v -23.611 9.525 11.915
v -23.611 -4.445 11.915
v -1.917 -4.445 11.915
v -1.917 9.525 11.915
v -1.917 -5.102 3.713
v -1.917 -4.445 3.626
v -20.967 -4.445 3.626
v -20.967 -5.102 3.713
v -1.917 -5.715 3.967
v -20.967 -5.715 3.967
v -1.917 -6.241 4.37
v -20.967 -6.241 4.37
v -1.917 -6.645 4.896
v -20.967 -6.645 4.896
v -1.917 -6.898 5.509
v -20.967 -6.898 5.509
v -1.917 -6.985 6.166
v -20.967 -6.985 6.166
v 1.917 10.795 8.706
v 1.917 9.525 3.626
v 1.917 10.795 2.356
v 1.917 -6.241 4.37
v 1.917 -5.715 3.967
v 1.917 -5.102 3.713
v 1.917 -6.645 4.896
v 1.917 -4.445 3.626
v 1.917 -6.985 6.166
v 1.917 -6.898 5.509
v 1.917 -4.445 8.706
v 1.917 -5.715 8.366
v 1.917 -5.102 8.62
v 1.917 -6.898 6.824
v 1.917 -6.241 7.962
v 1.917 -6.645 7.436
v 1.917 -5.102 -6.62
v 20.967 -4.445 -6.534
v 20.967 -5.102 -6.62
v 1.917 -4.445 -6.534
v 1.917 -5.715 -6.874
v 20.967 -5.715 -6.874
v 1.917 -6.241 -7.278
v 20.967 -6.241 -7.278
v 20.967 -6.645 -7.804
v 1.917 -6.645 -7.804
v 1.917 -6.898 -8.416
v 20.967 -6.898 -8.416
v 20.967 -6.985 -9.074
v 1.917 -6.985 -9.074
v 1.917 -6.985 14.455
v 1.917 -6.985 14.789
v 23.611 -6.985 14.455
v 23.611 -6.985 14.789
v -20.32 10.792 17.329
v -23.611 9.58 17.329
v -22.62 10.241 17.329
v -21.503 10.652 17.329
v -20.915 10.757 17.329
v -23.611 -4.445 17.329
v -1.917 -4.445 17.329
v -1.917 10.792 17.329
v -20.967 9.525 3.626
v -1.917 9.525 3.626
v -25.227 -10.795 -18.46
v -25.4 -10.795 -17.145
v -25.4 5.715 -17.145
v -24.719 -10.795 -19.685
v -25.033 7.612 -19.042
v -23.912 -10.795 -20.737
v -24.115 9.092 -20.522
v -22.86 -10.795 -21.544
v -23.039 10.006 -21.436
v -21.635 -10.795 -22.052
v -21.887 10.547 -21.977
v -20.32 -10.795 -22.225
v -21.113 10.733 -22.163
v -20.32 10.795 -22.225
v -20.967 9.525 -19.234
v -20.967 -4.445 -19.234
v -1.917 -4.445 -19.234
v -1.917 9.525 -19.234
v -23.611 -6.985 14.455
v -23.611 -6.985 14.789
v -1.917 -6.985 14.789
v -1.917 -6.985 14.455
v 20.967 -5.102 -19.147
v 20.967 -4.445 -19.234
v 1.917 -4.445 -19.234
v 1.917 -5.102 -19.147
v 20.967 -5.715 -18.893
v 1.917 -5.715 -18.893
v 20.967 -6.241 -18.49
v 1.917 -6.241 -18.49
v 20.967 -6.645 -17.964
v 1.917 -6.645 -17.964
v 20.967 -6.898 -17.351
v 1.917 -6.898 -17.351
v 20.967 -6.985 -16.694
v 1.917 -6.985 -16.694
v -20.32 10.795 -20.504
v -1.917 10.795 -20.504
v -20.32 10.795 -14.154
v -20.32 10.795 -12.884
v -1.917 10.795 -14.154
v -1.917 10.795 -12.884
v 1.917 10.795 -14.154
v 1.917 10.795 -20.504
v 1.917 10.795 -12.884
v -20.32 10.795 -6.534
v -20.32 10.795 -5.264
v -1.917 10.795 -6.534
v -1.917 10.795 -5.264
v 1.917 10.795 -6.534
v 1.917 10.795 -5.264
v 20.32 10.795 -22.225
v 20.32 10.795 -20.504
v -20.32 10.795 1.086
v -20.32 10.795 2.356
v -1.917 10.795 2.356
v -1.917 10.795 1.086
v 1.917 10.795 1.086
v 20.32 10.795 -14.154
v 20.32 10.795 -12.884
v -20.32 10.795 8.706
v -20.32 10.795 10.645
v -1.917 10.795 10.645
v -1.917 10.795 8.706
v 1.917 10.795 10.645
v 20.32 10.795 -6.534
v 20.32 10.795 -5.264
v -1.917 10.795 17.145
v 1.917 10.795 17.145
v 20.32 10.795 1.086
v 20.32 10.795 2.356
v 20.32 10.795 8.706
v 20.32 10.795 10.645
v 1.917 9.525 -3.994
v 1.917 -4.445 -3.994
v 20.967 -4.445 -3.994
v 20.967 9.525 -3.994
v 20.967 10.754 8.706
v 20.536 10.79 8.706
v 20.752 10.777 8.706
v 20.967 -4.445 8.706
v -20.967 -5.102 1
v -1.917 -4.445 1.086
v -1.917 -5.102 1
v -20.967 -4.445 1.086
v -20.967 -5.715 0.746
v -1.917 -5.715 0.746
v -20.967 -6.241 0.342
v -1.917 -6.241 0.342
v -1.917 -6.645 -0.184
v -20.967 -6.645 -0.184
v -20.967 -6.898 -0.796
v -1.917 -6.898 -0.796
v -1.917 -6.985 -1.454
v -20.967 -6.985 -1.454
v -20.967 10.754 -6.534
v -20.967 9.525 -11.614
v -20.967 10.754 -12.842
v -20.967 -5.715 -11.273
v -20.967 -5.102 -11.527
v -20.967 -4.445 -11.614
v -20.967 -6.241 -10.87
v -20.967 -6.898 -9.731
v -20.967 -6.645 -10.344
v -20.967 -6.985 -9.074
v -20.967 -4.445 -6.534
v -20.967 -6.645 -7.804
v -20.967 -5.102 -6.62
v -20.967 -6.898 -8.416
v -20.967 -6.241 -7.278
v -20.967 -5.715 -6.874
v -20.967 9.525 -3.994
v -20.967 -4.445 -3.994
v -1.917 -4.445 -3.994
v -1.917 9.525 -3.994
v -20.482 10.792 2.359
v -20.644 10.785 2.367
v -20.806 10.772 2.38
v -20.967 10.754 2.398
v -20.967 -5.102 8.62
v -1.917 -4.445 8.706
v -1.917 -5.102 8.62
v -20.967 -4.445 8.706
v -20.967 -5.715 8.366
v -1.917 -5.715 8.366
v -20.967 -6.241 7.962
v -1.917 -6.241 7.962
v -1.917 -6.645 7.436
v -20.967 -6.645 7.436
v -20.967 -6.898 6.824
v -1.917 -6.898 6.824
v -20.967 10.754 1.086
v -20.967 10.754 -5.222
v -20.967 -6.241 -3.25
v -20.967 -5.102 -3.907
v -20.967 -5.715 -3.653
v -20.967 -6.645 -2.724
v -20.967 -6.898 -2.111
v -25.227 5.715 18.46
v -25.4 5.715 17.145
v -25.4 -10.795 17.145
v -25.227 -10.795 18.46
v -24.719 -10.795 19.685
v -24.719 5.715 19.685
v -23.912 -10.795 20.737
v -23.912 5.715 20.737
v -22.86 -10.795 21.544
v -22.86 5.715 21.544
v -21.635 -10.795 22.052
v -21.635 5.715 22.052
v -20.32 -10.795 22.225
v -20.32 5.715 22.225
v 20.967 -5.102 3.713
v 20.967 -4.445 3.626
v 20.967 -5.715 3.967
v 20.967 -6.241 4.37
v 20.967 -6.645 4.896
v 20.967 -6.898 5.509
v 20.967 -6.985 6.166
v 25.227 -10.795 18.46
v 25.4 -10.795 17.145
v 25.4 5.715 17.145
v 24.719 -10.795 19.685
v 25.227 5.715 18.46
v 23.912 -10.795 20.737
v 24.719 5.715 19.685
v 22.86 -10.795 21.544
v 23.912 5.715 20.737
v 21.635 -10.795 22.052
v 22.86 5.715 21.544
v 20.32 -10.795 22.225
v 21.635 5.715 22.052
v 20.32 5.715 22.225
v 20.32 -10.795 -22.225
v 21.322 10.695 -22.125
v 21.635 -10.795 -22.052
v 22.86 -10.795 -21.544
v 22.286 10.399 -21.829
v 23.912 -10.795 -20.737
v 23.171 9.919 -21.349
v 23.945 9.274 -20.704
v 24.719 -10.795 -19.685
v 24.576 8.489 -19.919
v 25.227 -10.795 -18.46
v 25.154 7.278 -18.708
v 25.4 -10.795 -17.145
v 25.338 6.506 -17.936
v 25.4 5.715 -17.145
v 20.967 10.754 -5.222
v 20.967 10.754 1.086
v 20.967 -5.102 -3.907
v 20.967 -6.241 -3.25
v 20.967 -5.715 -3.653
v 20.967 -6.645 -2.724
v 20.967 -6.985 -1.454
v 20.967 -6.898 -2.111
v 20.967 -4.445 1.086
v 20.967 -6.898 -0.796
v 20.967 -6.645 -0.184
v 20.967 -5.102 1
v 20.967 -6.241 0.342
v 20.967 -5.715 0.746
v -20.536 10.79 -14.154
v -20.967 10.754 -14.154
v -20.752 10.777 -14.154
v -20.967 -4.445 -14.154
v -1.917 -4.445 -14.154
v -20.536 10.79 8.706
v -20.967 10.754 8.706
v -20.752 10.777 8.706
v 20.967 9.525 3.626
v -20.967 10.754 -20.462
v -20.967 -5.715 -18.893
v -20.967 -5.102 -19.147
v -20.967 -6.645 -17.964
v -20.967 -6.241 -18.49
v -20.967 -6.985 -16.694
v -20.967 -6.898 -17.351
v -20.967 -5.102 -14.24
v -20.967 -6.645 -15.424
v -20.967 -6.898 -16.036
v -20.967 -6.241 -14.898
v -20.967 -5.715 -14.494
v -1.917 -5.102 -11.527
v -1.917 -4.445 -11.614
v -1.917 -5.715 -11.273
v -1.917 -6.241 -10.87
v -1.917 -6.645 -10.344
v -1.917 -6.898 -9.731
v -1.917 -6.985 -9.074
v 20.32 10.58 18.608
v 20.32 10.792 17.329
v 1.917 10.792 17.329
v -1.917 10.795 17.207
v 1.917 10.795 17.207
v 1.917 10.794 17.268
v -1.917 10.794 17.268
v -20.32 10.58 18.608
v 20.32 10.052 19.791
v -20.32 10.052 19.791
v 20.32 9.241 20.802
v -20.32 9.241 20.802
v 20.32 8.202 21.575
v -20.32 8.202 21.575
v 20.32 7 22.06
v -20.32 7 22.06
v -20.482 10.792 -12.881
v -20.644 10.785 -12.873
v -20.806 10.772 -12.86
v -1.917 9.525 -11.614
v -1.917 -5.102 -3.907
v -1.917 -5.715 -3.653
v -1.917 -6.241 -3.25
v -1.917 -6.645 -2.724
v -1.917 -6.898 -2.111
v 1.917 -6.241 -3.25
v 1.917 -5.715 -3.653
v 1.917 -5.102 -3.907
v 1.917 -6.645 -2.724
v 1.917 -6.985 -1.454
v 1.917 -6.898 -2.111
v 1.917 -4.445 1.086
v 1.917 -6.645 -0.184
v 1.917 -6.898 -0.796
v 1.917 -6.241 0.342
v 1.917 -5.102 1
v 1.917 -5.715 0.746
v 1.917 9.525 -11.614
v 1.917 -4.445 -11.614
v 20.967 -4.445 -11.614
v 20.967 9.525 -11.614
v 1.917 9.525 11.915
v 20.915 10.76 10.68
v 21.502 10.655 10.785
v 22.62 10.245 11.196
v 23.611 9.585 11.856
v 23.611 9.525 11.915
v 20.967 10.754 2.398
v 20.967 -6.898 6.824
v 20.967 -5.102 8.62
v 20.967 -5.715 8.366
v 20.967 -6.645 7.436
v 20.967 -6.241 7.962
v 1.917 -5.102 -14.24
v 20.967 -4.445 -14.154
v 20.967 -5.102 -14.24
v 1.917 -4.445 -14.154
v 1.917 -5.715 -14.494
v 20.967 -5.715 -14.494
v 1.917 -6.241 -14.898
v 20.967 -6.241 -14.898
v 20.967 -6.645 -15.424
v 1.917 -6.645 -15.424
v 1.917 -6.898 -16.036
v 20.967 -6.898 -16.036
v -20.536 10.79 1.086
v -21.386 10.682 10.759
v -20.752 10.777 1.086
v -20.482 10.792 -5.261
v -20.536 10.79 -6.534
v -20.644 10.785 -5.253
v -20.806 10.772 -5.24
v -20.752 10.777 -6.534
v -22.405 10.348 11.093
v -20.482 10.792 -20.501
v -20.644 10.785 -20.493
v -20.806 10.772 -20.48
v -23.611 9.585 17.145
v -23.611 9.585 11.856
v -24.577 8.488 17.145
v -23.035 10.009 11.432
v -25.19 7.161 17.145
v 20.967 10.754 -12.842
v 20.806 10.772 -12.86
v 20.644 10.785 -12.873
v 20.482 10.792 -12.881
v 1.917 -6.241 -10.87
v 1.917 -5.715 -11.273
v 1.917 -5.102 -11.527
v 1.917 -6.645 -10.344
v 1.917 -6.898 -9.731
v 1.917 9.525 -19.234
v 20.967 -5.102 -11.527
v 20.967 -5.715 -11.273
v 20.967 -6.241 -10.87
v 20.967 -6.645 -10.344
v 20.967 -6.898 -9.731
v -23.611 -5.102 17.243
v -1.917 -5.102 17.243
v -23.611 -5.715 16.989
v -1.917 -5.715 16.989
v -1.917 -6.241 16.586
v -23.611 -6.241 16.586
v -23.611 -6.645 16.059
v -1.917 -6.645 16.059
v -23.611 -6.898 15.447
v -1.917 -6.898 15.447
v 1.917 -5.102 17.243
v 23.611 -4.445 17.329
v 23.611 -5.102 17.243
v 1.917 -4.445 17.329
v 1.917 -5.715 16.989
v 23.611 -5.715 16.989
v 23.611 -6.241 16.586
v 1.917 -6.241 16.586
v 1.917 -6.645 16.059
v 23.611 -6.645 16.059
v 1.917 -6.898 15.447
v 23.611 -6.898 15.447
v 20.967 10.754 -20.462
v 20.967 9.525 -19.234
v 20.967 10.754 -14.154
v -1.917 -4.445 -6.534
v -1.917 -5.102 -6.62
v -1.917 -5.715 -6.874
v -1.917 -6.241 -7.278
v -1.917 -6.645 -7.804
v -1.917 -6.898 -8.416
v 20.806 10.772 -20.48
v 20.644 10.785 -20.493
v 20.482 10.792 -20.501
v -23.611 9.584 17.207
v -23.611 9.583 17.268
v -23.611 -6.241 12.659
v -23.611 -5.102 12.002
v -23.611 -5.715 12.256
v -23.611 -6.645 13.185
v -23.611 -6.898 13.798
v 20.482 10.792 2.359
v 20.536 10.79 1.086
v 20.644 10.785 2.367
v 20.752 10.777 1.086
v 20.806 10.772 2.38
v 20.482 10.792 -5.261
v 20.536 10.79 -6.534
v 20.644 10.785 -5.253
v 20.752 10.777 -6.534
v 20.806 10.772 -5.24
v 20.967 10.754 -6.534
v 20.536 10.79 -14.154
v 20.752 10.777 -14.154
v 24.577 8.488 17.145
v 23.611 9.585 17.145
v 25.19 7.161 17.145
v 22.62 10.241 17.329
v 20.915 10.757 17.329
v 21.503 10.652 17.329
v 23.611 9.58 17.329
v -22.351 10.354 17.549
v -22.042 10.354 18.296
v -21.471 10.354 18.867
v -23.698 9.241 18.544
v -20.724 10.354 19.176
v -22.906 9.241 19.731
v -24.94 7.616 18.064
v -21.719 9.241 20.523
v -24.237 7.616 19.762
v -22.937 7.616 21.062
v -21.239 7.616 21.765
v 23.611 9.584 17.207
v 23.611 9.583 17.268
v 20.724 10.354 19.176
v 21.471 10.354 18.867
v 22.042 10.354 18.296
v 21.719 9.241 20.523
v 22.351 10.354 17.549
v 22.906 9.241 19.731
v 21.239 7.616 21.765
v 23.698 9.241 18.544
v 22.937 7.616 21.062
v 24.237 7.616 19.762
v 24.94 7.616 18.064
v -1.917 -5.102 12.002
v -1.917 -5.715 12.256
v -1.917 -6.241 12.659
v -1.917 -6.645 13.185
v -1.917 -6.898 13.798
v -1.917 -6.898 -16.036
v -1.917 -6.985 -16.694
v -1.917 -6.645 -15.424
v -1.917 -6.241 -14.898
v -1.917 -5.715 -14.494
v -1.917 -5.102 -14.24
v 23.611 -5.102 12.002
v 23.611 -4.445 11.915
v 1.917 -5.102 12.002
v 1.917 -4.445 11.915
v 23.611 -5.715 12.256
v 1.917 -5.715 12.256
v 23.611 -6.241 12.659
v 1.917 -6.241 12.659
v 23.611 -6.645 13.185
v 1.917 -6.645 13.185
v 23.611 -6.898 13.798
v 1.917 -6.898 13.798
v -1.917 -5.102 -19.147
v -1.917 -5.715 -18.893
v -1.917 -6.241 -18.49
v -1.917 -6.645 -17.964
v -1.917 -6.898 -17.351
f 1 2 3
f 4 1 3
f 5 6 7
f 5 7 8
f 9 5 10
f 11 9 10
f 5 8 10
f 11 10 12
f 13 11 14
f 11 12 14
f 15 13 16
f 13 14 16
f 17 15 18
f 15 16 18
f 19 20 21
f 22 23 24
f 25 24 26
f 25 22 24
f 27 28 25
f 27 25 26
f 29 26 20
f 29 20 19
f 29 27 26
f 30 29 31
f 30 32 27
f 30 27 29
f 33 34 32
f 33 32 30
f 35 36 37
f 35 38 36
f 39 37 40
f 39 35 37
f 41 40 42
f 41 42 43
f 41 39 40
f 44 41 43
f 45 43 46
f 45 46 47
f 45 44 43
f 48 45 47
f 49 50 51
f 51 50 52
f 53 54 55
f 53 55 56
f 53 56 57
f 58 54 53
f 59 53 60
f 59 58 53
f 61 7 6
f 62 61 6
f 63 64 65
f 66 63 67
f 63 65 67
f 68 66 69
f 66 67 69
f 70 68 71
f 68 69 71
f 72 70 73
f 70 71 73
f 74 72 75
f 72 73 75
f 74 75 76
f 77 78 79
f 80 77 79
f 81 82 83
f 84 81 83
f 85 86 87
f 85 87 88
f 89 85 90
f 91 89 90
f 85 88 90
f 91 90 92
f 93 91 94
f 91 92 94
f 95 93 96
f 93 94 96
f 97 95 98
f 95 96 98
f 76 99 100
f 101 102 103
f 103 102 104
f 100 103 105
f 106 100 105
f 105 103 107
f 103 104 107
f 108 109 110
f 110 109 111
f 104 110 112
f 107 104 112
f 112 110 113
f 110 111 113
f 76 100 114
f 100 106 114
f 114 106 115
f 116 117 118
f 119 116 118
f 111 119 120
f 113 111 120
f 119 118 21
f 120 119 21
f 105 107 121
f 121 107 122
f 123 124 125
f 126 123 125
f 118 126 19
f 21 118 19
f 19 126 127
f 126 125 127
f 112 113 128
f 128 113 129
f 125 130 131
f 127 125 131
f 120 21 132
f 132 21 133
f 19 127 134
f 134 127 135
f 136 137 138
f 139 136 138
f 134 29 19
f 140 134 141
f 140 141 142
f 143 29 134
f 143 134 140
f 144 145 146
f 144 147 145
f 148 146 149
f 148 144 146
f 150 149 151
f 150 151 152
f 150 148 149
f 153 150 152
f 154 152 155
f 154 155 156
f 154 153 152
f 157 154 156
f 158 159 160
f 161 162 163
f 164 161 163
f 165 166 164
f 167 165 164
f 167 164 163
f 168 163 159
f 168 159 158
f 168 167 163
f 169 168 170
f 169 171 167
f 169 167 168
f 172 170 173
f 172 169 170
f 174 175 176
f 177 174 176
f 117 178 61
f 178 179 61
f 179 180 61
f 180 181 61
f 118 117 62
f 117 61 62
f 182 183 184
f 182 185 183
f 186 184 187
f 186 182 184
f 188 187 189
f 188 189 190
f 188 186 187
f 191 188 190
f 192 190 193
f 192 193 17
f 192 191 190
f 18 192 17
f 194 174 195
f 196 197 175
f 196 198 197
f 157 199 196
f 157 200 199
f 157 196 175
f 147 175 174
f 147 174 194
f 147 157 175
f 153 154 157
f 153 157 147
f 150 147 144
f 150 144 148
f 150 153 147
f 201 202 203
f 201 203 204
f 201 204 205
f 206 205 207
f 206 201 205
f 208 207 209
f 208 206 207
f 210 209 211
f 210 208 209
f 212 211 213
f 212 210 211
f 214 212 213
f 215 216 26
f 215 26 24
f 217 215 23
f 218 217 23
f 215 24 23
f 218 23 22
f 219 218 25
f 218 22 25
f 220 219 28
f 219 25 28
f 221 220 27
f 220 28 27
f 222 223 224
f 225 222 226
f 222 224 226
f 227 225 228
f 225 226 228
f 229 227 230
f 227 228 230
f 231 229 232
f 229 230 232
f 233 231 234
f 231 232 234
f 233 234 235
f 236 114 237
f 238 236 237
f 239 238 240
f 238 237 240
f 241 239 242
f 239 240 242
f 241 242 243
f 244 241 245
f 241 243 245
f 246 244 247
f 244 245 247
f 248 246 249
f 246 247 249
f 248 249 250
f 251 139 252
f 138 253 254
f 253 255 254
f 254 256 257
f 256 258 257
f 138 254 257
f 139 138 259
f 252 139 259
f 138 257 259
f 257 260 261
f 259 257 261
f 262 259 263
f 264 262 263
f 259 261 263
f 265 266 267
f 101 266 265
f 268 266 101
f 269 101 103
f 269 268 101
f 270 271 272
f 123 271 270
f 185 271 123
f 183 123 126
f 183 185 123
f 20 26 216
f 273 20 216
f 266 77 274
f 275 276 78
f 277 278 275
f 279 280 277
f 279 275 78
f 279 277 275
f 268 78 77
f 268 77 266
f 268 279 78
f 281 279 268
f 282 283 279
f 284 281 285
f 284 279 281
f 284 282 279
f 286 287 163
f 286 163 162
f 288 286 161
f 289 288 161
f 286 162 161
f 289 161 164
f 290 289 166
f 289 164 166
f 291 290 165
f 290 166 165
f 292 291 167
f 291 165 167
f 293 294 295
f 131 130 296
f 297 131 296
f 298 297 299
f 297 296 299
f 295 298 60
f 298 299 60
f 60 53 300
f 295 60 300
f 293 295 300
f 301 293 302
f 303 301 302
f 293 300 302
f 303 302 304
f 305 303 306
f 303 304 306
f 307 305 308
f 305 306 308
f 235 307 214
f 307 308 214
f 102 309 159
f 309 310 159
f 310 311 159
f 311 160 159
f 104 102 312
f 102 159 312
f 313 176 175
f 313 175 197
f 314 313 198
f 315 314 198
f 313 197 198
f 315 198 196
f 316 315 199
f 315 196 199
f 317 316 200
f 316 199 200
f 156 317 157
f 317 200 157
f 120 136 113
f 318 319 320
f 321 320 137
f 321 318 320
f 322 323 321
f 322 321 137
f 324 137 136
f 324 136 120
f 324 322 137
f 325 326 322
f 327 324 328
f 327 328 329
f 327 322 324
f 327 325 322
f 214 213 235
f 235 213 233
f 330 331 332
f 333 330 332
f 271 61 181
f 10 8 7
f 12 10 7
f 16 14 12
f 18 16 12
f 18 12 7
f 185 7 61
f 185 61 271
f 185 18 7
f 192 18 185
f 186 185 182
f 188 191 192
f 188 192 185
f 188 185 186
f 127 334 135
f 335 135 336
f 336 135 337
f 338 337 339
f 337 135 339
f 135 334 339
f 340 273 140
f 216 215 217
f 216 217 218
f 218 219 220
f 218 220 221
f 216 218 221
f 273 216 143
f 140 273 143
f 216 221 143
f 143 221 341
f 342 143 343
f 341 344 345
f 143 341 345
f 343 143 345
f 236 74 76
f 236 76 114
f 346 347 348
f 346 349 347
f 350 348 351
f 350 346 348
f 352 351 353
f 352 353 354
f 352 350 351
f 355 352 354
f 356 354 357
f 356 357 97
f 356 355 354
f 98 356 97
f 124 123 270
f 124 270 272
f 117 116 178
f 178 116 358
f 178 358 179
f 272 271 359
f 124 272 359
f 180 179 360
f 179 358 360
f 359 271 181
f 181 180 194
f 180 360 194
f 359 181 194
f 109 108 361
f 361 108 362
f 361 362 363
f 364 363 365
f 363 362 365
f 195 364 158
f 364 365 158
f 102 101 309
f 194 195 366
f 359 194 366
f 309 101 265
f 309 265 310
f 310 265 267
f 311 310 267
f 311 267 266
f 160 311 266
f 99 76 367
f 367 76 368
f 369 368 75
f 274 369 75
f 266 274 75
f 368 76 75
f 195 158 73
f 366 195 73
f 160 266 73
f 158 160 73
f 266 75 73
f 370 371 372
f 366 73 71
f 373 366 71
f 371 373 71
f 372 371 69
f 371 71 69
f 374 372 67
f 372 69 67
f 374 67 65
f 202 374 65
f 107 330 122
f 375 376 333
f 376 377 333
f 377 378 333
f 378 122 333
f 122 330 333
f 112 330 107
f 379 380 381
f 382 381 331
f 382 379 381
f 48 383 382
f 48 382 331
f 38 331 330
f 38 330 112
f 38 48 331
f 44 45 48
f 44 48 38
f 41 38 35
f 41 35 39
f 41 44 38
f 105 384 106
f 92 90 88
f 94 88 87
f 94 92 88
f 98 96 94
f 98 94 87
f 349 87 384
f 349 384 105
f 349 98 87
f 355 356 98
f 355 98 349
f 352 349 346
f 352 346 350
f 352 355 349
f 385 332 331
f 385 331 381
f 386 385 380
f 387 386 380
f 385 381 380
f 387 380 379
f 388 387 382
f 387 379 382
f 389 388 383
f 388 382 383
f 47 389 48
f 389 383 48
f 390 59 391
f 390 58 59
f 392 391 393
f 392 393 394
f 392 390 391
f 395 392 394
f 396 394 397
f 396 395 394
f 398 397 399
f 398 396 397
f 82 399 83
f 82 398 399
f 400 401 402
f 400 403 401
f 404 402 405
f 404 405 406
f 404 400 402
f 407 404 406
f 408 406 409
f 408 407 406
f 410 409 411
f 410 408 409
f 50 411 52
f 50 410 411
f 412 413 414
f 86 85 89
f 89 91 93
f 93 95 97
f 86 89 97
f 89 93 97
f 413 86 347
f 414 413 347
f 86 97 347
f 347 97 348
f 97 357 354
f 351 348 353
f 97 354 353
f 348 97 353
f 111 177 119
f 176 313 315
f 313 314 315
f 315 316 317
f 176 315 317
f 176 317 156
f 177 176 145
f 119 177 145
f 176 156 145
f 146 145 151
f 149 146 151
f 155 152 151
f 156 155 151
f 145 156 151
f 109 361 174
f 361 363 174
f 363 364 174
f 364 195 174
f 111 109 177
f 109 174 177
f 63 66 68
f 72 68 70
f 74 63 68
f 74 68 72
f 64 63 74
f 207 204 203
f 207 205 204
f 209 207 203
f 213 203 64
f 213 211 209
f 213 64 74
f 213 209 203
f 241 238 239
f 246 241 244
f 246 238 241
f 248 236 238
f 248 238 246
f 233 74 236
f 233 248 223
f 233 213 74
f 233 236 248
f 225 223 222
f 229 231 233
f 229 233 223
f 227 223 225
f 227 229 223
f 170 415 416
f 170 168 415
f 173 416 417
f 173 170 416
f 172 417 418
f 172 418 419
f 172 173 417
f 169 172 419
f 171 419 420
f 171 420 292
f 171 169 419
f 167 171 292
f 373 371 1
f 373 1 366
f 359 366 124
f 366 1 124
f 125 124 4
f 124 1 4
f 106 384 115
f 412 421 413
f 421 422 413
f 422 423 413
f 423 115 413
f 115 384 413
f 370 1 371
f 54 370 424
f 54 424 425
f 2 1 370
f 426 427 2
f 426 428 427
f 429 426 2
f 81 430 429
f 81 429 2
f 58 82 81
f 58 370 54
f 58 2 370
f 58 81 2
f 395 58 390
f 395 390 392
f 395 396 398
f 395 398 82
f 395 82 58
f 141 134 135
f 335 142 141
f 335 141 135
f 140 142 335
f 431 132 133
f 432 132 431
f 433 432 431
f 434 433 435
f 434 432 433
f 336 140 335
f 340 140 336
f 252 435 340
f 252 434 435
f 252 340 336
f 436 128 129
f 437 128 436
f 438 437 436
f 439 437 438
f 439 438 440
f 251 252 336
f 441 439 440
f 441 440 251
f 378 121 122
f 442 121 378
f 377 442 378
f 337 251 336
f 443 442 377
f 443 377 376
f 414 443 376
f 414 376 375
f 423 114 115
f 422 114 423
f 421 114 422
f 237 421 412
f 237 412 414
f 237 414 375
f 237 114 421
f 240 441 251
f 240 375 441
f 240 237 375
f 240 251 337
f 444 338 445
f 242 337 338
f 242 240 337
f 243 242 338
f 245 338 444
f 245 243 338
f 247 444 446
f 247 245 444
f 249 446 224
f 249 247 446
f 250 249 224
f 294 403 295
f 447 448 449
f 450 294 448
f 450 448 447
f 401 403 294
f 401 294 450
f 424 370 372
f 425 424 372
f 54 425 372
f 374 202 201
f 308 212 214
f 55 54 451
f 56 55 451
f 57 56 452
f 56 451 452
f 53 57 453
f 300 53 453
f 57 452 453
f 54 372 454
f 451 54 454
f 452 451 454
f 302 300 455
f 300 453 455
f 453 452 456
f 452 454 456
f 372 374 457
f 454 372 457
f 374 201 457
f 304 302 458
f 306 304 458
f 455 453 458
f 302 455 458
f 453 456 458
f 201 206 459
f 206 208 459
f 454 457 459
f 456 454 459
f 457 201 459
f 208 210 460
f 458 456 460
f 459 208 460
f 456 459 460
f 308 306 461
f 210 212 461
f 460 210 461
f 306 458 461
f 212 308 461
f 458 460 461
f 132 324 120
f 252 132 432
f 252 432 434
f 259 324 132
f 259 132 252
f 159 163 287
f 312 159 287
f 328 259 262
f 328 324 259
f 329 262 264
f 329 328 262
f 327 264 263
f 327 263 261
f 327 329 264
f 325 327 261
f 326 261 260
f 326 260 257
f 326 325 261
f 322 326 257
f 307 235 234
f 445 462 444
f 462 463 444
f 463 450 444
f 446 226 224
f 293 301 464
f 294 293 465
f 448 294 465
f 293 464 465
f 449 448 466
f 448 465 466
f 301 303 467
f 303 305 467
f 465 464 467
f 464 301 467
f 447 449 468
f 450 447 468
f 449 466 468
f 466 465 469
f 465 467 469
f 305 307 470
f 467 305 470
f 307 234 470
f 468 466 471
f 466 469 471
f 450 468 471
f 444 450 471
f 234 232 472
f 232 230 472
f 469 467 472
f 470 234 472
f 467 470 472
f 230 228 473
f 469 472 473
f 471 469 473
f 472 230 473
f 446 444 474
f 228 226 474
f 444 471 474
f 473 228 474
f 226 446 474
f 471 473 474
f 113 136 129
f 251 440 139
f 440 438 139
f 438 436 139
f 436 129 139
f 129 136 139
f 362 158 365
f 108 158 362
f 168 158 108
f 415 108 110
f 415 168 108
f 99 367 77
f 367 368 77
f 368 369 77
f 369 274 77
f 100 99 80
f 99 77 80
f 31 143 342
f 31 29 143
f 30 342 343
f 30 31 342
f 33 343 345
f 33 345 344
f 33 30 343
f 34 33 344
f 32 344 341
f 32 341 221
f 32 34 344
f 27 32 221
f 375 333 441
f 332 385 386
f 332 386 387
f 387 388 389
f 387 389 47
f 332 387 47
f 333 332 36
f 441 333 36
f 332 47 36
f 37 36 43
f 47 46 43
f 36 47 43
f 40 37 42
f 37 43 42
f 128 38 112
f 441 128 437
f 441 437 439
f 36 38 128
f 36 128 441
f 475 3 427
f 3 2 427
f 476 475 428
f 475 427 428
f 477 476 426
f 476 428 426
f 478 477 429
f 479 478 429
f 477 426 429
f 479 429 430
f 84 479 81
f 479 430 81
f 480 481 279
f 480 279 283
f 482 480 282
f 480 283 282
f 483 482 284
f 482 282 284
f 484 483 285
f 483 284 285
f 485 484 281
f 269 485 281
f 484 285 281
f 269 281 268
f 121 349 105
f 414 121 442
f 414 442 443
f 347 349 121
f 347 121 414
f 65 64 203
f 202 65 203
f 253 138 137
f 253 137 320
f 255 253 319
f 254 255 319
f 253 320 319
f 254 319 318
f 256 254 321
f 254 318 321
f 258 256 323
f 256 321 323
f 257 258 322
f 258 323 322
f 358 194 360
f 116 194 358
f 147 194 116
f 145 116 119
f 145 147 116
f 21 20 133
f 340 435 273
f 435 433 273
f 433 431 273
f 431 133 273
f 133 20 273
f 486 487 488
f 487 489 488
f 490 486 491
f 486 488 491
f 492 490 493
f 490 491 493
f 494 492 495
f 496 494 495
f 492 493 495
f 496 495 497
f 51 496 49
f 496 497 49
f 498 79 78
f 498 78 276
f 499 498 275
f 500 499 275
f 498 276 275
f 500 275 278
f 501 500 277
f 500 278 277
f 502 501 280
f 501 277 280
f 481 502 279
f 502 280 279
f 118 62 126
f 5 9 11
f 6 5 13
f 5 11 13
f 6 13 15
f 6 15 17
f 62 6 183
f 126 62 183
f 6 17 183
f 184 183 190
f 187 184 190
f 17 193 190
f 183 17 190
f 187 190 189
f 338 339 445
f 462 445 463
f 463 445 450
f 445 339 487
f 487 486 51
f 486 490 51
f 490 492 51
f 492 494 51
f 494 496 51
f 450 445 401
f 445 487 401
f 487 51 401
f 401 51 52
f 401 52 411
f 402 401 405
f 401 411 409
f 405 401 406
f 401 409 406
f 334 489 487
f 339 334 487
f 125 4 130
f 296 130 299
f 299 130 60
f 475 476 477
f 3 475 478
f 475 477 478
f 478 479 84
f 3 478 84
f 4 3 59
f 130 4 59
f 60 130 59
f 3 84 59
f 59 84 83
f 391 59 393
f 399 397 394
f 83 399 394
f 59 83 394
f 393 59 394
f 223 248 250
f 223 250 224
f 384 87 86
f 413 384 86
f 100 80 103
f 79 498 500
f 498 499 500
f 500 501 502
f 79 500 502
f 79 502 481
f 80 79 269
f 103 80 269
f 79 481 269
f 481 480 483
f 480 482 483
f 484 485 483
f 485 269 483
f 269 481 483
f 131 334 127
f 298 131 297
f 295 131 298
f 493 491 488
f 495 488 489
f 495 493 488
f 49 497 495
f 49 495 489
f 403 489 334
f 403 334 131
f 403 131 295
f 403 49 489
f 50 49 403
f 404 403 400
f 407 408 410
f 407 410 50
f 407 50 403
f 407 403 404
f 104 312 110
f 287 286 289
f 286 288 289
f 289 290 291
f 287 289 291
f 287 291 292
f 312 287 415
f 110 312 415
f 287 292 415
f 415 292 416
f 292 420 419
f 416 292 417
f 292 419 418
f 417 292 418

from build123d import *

# Parameters (mm, degrees)
F0_W         = 50.8
F0_H         = 44.45
F0_W_2       = 19.05
F0_H_2       = 5.08
F0_W_3       = 21.6944364339
F0_H_3       = 5.4140361476
F1_DEPTH     = 10.795
F2_W         = 50.8
F2_H         = 44.45
F3_DEPTH     = 3.81
F4_R         = 5.08
F5_SIZE      = 1.27
F6_R         = 2.54
F7_R         = 2.53999
F8_T1_DEPTH  = 52.07
F8_T3_DEPTH  = 46.99
F8_T5_DEPTH  = 40.64
F8_T8_ANGLE  = 90
F8_T10_ANGLE = 90


# Not quite as in the source:
# - a fillet or chamfer that OpenCascade refuses, or shapes differently, is made with other operations: its cross-section is extruded or revolved along the edge and cut away or added
# - a fillet or chamfer is up to 0.001 mm smaller than in the source, because OpenCascade refuses the exact size


with BuildPart() as f1:
    # F0 (on Front) → F1 (new body, symmetric)
    with BuildSketch(Plane.XZ):
        Rectangle(F0_W, F0_H)
        with Locations((-11.4416993469, -16.6936574811)):
            Rectangle(F0_W_2, F0_H_2, mode=Mode.SUBTRACT)
        with Locations((-11.4416993469, -9.0736574811)):
            Rectangle(F0_W_2, F0_H_2, mode=Mode.SUBTRACT)
        with Locations((-11.4416993469, -1.4536574811)):
            Rectangle(F0_W_2, F0_H_2, mode=Mode.SUBTRACT)
        with Locations((11.4416993469, -16.6936574811)):
            Rectangle(F0_W_2, F0_H_2, mode=Mode.SUBTRACT)
        with Locations((11.4416993469, -9.0736574811)):
            Rectangle(F0_W_2, F0_H_2, mode=Mode.SUBTRACT)
        with Locations((11.4416993469, -1.4536574811)):
            Rectangle(F0_W_2, F0_H_2, mode=Mode.SUBTRACT)
        with Locations((-11.4416993469, 6.1663425189)):
            Rectangle(F0_W_2, F0_H_2, mode=Mode.SUBTRACT)
        with Locations((-12.7639175639, 14.6224689895)):
            Rectangle(F0_W_3, F0_H_3, mode=Mode.SUBTRACT)
        with Locations((11.4416993469, 6.1663425189)):
            Rectangle(F0_W_2, F0_H_2, mode=Mode.SUBTRACT)
        with Locations((12.7639175639, 14.6224689895)):
            Rectangle(F0_W_3, F0_H_3, mode=Mode.SUBTRACT)
    extrude(amount=F1_DEPTH, both=True)

    # F2 (on face) → F3 (join)
    with BuildSketch(Plane.XZ.offset(10.795)):
        Rectangle(F2_W, F2_H)
    extrude(amount=-F3_DEPTH)

    # F4
    f4_edges = [f1.edges().sort_by_distance(p)[0] for p in [
        (25.4, 0, 22.225),
        (-25.4, 0, 22.225),
    ]]
    fillet(f4_edges, radius=F4_R)

    # F5
    f5_edges = [f1.edges().sort_by_distance(p)[0] for p in [
        (12.763918, 10.795, 11.915451),
        (-12.763918, 10.795, 11.915451),
        (-11.441699, 10.795, 3.626343),
        (11.441699, 10.795, 3.626343),
        (11.441699, 10.795, -3.993657),
        (-11.441699, 10.795, -3.993657),
        (-11.441699, 10.795, -11.613657),
        (11.441699, 10.795, -11.613657),
        (11.441699, 10.795, -19.233657),
        (-11.441699, 10.795, -19.233657),
    ]]
    chamfer(f5_edges, length=F5_SIZE)

    # F6
    f6_edges = [f1.edges().sort_by_distance(p)[0] for p in [
        (11.441699, -6.985, 3.626343),
        (-11.441699, -6.985, 3.626343),
        (-12.763918, -6.985, 11.915451),
        (12.763918, -6.985, 11.915451),
        (11.441699, -6.985, -3.993657),
        (-11.441699, -6.985, -3.993657),
        (11.441699, -6.985, -11.613657),
        (-11.441699, -6.985, -11.613657),
        (11.441699, -6.985, -19.233657),
        (-11.441699, -6.985, -19.233657),
    ]]
    fillet(f6_edges, radius=F6_R)

    # F7 (radius 2.54 in the source; OpenCascade refuses exactly that, so slightly less here)
    f7_edges = [f1.edges().sort_by_distance(p)[0] for p in [
        (11.441699, -6.985, 1.086343),
        (11.441699, -6.985, 8.706343),
        (-11.441699, -6.985, 8.706343),
        (-11.441699, -6.985, 1.086343),
        (-11.441699, -6.985, -6.533657),
        (11.441699, -6.985, -6.533657),
        (-12.763918, -6.985, 17.329487),
        (12.763918, -6.985, 17.329487),
        (11.441699, -6.985, -14.153657),
        (-11.441699, -6.985, -14.153657),
    ]]
    fillet(f7_edges, radius=F7_R)

    # F8: fillet of radius 5.08 on 4 edges, made by hand

    # F8_s2 → F8_t1 (cut)
    with BuildSketch(Plane.XY.offset(-34.925)):
        with BuildLine():
            ThreePointArc((20.32, 10.795), (23.9121024484, 9.3071024484), (25.4, 5.715))
            Line((25.4, 5.715), (25.4, 10.795))
            Line((25.4, 10.795), (20.32, 10.795))
        make_face()
        with BuildLine():
            ThreePointArc((-20.32, 10.795), (-23.9121024484, 9.3071024484), (-25.4, 5.715))
            Line((-25.4, 5.715), (-25.4, 10.795))
            Line((-25.4, 10.795), (-20.32, 10.795))
        make_face()
    extrude(amount=F8_T1_DEPTH, mode=Mode.SUBTRACT)

    # F8_s4 → F8_t3 (cut)
    with BuildSketch(Plane.XZ.offset(-23.495)):
        with BuildLine():
            ThreePointArc((-25.4, -17.145), (-23.9121024484, -20.7371024484), (-20.32, -22.225))
            Line((-20.32, -22.225), (-25.4, -22.225))
            Line((-25.4, -22.225), (-25.4, -17.145))
        make_face()
        with BuildLine():
            ThreePointArc((20.32, -22.225), (23.9121024484, -20.7371024484), (25.4, -17.145))
            Line((25.4, -17.145), (25.4, -22.225))
            Line((25.4, -22.225), (20.32, -22.225))
        make_face()
    extrude(amount=F8_T3_DEPTH, mode=Mode.SUBTRACT)

    # F8_s6 → F8_t5 (cut)
    with BuildSketch(Plane.YZ.offset(-20.32)):
        with BuildLine():
            ThreePointArc((10.795, 17.145), (9.3071024484, 20.7371024484), (5.715, 22.225))
            Line((5.715, 22.225), (10.795, 22.225))
            Line((10.795, 22.225), (10.795, 17.145))
        make_face()
    extrude(amount=F8_T5_DEPTH, mode=Mode.SUBTRACT)

    # F8_s7 → F8_t8 (revolve, cut)
    with BuildSketch(Plane.XY.offset(17.145)):
        with BuildLine():
            ThreePointArc((-20.32, 10.795), (-23.9121024484, 9.3071024484), (-25.4, 5.715))
            Line((-25.4, 5.715), (-25.4, 10.795))
            Line((-25.4, 10.795), (-20.32, 10.795))
        make_face()
    revolve(axis=Axis((-20.32, 10.795, 17.145), (0, 1, 0)), revolution_arc=F8_T8_ANGLE, mode=Mode.SUBTRACT)

    # F8_s9 → F8_t10 (revolve, cut)
    with BuildSketch(Plane.YZ.offset(20.32)):
        with BuildLine():
            ThreePointArc((10.795, 17.145), (9.3071024484, 20.7371024484), (5.715, 22.225))
            Line((5.715, 22.225), (10.795, 22.225))
            Line((10.795, 22.225), (10.795, 17.145))
        make_face()
    revolve(axis=Axis((20.32, 10.795, 17.145), (0, 1, 0)), revolution_arc=F8_T10_ANGLE, mode=Mode.SUBTRACT)


solid = f1.part
